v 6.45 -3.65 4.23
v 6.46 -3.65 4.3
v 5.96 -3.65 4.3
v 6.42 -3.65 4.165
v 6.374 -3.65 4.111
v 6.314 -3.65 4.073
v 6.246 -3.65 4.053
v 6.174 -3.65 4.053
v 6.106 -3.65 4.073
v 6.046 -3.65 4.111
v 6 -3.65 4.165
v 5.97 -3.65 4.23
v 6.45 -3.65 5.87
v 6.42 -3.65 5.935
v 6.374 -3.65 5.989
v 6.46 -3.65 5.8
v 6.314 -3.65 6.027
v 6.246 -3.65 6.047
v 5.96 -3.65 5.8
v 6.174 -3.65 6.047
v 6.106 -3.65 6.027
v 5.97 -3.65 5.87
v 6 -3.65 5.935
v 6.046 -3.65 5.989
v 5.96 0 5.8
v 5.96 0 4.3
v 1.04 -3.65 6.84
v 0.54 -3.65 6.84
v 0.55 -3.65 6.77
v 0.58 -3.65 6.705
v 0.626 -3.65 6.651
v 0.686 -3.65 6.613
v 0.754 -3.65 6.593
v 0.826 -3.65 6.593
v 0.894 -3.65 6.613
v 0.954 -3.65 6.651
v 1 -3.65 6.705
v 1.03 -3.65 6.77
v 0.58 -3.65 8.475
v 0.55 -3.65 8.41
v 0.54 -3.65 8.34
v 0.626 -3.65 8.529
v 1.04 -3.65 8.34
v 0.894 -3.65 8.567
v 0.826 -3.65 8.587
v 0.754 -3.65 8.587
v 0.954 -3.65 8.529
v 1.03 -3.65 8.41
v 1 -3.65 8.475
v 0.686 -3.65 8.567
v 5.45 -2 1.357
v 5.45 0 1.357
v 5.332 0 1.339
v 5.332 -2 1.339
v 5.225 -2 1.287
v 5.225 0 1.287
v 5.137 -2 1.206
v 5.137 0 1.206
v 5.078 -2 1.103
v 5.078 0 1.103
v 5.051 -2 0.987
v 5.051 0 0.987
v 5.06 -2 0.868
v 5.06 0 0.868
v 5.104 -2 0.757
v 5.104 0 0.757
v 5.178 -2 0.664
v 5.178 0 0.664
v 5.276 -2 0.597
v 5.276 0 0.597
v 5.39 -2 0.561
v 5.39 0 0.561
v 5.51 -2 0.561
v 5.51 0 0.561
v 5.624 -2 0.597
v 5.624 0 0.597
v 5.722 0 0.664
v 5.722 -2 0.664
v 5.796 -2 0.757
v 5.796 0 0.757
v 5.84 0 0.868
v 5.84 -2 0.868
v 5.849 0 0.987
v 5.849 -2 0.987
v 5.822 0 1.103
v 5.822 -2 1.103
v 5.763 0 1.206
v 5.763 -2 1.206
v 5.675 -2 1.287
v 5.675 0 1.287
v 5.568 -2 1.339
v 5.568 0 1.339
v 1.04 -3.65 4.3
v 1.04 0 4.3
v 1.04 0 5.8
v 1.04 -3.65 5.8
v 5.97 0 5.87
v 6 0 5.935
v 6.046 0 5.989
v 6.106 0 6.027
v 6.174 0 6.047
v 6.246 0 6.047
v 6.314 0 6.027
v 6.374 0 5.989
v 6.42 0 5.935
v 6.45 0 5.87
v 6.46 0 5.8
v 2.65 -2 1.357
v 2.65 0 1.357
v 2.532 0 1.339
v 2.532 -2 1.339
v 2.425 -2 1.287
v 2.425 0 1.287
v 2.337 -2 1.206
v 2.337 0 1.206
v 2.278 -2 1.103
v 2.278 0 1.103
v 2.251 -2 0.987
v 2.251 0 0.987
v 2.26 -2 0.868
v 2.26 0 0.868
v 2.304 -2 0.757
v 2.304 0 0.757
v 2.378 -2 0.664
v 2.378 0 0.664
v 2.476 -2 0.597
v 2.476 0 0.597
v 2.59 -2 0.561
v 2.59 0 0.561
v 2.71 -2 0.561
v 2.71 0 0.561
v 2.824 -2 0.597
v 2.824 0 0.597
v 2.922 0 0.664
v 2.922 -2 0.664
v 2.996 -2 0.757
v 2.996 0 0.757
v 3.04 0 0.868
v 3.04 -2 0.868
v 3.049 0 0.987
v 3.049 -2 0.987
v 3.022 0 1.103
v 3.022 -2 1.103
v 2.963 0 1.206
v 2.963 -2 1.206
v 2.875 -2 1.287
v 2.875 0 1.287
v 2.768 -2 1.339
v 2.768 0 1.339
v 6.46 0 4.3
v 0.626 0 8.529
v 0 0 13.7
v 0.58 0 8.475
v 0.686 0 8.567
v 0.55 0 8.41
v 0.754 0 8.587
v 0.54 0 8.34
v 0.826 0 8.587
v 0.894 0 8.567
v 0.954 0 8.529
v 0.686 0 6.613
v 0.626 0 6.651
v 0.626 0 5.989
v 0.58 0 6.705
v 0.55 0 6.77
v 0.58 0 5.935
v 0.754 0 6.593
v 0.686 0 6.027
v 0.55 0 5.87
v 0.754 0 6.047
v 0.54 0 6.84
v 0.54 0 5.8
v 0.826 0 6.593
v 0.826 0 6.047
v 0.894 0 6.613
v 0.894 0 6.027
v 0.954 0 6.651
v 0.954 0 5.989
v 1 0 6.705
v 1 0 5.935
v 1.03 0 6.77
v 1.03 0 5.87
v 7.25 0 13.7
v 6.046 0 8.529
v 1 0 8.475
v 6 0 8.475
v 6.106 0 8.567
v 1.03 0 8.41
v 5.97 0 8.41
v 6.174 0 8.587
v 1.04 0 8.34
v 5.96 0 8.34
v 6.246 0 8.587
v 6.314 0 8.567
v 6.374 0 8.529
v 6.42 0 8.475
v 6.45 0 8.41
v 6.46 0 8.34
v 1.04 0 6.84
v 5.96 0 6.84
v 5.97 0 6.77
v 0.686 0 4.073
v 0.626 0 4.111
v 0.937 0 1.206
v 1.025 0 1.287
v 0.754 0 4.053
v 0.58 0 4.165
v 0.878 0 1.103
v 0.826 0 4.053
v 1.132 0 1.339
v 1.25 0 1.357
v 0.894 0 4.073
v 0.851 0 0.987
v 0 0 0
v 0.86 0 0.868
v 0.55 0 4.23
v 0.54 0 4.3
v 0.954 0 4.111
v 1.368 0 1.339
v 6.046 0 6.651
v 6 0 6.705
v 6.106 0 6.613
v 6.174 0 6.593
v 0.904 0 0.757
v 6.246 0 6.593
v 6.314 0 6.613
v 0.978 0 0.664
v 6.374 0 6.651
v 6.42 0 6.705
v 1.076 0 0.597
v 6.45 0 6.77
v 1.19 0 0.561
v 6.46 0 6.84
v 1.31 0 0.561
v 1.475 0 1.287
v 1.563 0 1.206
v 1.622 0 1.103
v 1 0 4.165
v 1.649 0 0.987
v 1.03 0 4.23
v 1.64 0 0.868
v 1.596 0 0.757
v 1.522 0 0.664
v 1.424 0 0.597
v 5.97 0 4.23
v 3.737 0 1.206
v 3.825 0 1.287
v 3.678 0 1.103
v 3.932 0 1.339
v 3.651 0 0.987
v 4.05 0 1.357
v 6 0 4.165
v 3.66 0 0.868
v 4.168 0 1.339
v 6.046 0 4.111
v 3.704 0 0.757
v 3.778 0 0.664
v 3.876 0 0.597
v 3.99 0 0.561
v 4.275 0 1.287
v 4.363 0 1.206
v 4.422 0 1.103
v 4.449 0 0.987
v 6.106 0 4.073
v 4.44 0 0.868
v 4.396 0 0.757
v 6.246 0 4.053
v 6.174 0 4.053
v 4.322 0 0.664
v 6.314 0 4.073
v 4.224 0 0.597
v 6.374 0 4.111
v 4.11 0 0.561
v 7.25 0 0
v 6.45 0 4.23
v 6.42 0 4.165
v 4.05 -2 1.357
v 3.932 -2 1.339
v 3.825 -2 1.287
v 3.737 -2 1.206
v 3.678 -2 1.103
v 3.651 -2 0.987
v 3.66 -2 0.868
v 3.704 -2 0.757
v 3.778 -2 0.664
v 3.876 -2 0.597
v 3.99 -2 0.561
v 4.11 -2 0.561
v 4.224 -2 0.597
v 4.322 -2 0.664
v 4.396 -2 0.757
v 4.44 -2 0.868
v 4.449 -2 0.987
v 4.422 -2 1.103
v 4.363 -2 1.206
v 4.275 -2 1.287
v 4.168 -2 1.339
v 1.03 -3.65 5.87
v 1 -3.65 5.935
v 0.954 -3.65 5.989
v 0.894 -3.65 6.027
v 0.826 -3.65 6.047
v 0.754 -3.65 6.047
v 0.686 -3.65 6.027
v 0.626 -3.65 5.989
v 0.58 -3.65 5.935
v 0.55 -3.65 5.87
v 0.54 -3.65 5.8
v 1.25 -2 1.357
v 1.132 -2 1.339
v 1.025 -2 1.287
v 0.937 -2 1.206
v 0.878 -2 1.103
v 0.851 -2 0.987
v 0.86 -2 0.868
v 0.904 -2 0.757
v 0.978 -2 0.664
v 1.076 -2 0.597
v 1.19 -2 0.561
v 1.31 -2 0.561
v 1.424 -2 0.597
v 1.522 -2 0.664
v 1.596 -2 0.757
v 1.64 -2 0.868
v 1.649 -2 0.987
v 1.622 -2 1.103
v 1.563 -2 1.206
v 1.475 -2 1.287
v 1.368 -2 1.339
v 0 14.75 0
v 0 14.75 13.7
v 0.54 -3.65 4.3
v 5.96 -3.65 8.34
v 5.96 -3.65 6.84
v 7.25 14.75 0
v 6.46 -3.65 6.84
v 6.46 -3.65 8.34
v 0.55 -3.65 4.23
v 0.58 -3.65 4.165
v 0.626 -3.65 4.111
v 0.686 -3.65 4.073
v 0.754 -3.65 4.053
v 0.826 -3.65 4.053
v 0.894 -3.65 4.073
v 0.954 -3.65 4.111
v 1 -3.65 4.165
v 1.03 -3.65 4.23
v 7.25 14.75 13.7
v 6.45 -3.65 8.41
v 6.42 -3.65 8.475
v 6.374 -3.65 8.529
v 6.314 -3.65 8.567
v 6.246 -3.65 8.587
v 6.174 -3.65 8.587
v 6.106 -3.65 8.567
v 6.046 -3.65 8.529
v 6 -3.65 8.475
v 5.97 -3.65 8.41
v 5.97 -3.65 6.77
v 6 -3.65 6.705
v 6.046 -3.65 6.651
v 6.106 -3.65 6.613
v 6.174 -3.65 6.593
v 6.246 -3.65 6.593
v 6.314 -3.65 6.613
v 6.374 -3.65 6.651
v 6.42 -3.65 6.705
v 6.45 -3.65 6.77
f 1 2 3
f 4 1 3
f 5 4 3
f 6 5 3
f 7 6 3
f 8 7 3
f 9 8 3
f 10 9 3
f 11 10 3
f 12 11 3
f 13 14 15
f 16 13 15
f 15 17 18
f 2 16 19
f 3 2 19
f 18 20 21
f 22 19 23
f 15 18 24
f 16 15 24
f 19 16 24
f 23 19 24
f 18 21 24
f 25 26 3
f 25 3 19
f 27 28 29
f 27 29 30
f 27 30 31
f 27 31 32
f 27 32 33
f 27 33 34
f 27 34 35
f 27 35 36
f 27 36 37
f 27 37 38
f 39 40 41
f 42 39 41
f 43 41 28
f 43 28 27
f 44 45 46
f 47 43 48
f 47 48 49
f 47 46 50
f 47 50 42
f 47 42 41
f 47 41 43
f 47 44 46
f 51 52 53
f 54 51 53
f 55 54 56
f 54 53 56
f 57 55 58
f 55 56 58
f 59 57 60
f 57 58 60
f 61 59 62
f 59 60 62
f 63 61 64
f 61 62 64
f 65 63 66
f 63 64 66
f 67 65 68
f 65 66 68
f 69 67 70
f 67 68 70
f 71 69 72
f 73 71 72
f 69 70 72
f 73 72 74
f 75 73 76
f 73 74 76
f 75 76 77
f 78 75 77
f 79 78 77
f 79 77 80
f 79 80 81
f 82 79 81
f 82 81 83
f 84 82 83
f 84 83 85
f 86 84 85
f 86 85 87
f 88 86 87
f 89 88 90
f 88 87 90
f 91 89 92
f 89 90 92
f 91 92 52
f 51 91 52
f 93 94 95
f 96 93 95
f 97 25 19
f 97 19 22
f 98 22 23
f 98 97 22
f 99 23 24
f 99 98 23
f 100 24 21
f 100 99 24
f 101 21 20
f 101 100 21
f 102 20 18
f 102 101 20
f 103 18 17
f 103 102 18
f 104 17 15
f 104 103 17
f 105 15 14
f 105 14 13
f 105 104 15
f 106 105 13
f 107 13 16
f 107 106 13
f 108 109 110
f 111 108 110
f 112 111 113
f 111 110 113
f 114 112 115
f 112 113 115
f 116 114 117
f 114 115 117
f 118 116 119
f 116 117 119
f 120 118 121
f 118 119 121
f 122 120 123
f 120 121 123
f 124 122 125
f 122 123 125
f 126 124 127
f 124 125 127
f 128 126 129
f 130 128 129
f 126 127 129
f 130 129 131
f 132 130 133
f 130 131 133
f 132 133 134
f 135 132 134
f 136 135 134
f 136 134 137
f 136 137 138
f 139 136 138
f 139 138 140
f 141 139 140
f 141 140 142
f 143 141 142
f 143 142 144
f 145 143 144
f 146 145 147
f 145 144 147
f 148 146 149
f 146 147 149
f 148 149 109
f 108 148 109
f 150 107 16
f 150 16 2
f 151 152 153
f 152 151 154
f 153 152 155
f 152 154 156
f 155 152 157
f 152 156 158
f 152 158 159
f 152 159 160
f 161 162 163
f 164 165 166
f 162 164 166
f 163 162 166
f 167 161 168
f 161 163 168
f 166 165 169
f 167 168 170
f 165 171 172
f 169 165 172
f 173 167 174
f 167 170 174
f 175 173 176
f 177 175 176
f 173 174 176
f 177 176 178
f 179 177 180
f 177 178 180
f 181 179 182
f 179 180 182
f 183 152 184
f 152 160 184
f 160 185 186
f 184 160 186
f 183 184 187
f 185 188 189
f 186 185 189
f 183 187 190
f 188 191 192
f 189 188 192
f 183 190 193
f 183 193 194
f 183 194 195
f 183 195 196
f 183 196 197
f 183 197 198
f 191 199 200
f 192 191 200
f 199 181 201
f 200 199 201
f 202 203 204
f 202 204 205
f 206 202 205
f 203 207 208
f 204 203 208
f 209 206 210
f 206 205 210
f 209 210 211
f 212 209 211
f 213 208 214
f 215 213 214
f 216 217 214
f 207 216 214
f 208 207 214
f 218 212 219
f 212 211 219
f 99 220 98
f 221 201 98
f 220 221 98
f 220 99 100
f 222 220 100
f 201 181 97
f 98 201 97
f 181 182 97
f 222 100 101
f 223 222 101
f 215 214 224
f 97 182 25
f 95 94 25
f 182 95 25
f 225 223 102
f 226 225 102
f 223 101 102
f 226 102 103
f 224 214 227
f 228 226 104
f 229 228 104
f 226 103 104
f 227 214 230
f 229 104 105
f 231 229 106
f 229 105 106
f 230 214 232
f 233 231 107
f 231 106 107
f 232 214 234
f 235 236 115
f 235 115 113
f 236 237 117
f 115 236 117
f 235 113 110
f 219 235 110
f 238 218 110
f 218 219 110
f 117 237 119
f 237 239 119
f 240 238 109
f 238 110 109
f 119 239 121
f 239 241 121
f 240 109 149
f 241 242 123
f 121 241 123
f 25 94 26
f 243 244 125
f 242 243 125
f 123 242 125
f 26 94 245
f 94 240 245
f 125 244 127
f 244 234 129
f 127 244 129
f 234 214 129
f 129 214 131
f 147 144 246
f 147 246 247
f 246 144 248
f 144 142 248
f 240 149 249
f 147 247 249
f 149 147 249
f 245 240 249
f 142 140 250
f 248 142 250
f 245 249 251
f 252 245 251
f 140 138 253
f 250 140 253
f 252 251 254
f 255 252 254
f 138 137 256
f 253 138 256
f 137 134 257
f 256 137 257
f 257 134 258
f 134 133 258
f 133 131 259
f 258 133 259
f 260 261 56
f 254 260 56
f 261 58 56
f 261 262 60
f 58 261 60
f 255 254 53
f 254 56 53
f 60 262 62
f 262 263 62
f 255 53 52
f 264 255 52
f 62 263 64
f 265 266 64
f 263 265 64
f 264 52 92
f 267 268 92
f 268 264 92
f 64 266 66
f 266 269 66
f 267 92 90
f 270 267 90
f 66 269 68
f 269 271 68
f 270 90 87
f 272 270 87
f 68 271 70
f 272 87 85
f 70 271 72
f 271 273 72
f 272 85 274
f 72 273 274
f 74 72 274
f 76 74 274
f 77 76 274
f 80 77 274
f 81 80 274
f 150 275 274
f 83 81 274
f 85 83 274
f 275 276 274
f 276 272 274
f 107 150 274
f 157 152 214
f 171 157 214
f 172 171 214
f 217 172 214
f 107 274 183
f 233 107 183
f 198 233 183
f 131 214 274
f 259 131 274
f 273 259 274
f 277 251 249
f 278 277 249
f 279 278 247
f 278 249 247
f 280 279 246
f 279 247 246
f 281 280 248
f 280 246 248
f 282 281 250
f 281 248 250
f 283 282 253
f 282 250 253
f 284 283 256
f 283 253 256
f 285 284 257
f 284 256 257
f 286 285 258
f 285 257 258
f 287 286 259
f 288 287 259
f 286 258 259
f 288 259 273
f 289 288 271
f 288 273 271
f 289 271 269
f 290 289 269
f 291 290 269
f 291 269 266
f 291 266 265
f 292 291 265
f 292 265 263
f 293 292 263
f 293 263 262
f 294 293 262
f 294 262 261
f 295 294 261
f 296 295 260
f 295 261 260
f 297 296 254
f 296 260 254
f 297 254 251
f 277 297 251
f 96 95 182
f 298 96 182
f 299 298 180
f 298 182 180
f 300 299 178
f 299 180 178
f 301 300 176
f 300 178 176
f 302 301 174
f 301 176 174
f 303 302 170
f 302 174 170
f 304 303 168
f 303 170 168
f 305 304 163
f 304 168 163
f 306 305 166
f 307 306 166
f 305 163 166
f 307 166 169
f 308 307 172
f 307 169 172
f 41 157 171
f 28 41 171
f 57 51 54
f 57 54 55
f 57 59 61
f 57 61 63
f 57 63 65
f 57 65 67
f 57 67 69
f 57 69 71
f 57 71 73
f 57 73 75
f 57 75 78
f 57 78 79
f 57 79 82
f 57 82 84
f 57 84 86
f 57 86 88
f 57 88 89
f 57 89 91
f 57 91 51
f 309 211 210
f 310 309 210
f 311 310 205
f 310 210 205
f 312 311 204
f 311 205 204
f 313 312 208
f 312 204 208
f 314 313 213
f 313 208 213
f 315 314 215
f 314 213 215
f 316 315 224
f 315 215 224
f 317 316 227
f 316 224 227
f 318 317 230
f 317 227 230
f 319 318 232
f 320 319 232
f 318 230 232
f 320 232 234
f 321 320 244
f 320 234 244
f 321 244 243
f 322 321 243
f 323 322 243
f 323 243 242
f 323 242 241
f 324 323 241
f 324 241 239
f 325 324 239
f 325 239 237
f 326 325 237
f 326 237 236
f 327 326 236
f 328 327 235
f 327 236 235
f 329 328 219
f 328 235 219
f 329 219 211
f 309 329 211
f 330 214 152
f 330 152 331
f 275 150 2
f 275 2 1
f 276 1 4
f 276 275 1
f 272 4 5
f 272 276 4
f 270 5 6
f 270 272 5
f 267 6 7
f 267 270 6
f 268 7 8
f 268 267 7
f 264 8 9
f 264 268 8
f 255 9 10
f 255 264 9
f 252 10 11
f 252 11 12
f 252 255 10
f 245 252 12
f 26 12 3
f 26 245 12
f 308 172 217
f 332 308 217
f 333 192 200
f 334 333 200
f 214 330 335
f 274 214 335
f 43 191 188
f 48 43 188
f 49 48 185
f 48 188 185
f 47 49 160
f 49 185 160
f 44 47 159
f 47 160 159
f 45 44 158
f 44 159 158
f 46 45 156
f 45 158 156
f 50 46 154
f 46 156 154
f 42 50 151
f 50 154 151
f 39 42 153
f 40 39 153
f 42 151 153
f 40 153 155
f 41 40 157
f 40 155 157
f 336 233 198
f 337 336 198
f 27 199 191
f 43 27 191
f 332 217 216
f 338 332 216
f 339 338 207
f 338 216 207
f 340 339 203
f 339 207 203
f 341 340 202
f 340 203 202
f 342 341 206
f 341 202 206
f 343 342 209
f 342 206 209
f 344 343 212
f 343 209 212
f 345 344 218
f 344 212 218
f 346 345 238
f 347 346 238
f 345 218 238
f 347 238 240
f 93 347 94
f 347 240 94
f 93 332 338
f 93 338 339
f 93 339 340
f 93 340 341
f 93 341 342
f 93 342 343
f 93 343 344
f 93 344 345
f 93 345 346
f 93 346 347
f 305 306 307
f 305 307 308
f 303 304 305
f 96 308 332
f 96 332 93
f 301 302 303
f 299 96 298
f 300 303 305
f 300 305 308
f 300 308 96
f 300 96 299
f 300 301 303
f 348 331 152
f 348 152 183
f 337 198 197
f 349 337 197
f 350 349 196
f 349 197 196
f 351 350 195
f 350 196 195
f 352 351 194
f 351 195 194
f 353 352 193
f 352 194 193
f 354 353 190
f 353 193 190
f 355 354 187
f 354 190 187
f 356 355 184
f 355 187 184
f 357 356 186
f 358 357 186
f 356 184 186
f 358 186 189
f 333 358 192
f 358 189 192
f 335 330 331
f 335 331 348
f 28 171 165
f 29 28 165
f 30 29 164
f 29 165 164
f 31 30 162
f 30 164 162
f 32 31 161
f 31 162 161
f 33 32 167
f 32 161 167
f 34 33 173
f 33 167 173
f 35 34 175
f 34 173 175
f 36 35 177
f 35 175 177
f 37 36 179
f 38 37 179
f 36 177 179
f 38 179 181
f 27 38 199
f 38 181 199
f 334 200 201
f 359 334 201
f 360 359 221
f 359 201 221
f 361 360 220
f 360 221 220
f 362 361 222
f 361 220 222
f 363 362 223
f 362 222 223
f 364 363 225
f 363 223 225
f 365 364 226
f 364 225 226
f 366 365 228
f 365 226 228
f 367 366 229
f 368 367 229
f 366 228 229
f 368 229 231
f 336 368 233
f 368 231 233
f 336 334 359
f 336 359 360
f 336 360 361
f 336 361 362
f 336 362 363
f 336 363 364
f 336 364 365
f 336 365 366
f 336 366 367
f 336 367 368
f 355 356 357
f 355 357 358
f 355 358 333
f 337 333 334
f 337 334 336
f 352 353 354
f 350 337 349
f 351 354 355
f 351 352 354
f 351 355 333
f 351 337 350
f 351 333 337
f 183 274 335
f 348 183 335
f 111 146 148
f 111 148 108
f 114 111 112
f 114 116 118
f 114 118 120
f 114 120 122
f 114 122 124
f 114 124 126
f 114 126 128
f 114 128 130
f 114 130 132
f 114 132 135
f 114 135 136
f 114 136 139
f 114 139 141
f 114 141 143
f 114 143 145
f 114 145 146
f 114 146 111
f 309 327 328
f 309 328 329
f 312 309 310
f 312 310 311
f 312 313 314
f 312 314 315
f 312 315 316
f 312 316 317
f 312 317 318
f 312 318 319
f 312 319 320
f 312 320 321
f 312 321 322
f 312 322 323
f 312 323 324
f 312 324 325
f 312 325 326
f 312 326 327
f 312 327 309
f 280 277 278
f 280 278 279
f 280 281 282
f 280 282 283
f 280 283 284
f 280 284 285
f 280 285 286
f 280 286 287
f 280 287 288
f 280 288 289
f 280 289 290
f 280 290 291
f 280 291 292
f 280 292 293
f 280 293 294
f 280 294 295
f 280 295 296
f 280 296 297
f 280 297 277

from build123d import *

# Parameters (mm, degrees)
ESQUISSE1_W      = 7.25
ESQUISSE1_H      = 14.75
EXTRUSION1_DEPTH = 13.7
EXTRUSION2_DEPTH = 3.65
ESQUISSE3_R      = 0.4
EXTRUSION3_DEPTH = 2


with BuildPart() as part:
    # Esquisse1 → Extrusion1 (new body)
    with BuildSketch(Plane.XY):
        with Locations((3.625, 7.375)):
            Rectangle(ESQUISSE1_W, ESQUISSE1_H)
    extrude(amount=EXTRUSION1_DEPTH)

    # Esquisse2 → Extrusion2 (add)
    with BuildSketch(Plane.XZ):
        with BuildLine():
            Line((1.04, 6.84), (1.04, 8.34))
            ThreePointArc((1.04, 8.34), (0.79, 8.59), (0.54, 8.34))
            Line((0.54, 8.34), (0.54, 6.84))
            ThreePointArc((0.54, 6.84), (0.79, 6.59), (1.04, 6.84))
        make_face()
        with BuildLine():
            Line((6.46, 6.84), (6.46, 8.34))
            ThreePointArc((6.46, 8.34), (6.21, 8.59), (5.96, 8.34))
            Line((5.96, 8.34), (5.96, 6.84))
            ThreePointArc((5.96, 6.84), (6.21, 6.59), (6.46, 6.84))
        make_face()
        with BuildLine():
            Line((1.04, 4.3), (1.04, 5.8))
            ThreePointArc((1.04, 5.8), (0.79, 6.05), (0.54, 5.8))
            Line((0.54, 5.8), (0.54, 4.3))
            ThreePointArc((0.54, 4.3), (0.79, 4.05), (1.04, 4.3))
        make_face()
        with BuildLine():
            Line((5.96, 4.3), (5.96, 5.8))
            ThreePointArc((5.96, 5.8), (6.21, 6.05), (6.46, 5.8))
            Line((6.46, 5.8), (6.46, 4.3))
            ThreePointArc((6.46, 4.3), (6.21, 4.05), (5.96, 4.3))
        make_face()
    extrude(amount=EXTRUSION2_DEPTH)

    # Esquisse3 → Extrusion3 (add)
    with BuildSketch(Plane.XZ):
        with Locations(Location((4.05, 0.956934673, 0), (0, 0, 90))):
            Circle(ESQUISSE3_R)
        with Locations(Location((2.65, 0.956934673, 0), (0, 0, 90))):
            Circle(ESQUISSE3_R)
        with Locations(Location((1.25, 0.956934673, 0), (0, 0, 90))):
            Circle(ESQUISSE3_R)
        with Locations(Location((5.45, 0.956934673, 0), (0, 0, 90))):
            Circle(ESQUISSE3_R)
    extrude(amount=EXTRUSION3_DEPTH)


solid = part.part
